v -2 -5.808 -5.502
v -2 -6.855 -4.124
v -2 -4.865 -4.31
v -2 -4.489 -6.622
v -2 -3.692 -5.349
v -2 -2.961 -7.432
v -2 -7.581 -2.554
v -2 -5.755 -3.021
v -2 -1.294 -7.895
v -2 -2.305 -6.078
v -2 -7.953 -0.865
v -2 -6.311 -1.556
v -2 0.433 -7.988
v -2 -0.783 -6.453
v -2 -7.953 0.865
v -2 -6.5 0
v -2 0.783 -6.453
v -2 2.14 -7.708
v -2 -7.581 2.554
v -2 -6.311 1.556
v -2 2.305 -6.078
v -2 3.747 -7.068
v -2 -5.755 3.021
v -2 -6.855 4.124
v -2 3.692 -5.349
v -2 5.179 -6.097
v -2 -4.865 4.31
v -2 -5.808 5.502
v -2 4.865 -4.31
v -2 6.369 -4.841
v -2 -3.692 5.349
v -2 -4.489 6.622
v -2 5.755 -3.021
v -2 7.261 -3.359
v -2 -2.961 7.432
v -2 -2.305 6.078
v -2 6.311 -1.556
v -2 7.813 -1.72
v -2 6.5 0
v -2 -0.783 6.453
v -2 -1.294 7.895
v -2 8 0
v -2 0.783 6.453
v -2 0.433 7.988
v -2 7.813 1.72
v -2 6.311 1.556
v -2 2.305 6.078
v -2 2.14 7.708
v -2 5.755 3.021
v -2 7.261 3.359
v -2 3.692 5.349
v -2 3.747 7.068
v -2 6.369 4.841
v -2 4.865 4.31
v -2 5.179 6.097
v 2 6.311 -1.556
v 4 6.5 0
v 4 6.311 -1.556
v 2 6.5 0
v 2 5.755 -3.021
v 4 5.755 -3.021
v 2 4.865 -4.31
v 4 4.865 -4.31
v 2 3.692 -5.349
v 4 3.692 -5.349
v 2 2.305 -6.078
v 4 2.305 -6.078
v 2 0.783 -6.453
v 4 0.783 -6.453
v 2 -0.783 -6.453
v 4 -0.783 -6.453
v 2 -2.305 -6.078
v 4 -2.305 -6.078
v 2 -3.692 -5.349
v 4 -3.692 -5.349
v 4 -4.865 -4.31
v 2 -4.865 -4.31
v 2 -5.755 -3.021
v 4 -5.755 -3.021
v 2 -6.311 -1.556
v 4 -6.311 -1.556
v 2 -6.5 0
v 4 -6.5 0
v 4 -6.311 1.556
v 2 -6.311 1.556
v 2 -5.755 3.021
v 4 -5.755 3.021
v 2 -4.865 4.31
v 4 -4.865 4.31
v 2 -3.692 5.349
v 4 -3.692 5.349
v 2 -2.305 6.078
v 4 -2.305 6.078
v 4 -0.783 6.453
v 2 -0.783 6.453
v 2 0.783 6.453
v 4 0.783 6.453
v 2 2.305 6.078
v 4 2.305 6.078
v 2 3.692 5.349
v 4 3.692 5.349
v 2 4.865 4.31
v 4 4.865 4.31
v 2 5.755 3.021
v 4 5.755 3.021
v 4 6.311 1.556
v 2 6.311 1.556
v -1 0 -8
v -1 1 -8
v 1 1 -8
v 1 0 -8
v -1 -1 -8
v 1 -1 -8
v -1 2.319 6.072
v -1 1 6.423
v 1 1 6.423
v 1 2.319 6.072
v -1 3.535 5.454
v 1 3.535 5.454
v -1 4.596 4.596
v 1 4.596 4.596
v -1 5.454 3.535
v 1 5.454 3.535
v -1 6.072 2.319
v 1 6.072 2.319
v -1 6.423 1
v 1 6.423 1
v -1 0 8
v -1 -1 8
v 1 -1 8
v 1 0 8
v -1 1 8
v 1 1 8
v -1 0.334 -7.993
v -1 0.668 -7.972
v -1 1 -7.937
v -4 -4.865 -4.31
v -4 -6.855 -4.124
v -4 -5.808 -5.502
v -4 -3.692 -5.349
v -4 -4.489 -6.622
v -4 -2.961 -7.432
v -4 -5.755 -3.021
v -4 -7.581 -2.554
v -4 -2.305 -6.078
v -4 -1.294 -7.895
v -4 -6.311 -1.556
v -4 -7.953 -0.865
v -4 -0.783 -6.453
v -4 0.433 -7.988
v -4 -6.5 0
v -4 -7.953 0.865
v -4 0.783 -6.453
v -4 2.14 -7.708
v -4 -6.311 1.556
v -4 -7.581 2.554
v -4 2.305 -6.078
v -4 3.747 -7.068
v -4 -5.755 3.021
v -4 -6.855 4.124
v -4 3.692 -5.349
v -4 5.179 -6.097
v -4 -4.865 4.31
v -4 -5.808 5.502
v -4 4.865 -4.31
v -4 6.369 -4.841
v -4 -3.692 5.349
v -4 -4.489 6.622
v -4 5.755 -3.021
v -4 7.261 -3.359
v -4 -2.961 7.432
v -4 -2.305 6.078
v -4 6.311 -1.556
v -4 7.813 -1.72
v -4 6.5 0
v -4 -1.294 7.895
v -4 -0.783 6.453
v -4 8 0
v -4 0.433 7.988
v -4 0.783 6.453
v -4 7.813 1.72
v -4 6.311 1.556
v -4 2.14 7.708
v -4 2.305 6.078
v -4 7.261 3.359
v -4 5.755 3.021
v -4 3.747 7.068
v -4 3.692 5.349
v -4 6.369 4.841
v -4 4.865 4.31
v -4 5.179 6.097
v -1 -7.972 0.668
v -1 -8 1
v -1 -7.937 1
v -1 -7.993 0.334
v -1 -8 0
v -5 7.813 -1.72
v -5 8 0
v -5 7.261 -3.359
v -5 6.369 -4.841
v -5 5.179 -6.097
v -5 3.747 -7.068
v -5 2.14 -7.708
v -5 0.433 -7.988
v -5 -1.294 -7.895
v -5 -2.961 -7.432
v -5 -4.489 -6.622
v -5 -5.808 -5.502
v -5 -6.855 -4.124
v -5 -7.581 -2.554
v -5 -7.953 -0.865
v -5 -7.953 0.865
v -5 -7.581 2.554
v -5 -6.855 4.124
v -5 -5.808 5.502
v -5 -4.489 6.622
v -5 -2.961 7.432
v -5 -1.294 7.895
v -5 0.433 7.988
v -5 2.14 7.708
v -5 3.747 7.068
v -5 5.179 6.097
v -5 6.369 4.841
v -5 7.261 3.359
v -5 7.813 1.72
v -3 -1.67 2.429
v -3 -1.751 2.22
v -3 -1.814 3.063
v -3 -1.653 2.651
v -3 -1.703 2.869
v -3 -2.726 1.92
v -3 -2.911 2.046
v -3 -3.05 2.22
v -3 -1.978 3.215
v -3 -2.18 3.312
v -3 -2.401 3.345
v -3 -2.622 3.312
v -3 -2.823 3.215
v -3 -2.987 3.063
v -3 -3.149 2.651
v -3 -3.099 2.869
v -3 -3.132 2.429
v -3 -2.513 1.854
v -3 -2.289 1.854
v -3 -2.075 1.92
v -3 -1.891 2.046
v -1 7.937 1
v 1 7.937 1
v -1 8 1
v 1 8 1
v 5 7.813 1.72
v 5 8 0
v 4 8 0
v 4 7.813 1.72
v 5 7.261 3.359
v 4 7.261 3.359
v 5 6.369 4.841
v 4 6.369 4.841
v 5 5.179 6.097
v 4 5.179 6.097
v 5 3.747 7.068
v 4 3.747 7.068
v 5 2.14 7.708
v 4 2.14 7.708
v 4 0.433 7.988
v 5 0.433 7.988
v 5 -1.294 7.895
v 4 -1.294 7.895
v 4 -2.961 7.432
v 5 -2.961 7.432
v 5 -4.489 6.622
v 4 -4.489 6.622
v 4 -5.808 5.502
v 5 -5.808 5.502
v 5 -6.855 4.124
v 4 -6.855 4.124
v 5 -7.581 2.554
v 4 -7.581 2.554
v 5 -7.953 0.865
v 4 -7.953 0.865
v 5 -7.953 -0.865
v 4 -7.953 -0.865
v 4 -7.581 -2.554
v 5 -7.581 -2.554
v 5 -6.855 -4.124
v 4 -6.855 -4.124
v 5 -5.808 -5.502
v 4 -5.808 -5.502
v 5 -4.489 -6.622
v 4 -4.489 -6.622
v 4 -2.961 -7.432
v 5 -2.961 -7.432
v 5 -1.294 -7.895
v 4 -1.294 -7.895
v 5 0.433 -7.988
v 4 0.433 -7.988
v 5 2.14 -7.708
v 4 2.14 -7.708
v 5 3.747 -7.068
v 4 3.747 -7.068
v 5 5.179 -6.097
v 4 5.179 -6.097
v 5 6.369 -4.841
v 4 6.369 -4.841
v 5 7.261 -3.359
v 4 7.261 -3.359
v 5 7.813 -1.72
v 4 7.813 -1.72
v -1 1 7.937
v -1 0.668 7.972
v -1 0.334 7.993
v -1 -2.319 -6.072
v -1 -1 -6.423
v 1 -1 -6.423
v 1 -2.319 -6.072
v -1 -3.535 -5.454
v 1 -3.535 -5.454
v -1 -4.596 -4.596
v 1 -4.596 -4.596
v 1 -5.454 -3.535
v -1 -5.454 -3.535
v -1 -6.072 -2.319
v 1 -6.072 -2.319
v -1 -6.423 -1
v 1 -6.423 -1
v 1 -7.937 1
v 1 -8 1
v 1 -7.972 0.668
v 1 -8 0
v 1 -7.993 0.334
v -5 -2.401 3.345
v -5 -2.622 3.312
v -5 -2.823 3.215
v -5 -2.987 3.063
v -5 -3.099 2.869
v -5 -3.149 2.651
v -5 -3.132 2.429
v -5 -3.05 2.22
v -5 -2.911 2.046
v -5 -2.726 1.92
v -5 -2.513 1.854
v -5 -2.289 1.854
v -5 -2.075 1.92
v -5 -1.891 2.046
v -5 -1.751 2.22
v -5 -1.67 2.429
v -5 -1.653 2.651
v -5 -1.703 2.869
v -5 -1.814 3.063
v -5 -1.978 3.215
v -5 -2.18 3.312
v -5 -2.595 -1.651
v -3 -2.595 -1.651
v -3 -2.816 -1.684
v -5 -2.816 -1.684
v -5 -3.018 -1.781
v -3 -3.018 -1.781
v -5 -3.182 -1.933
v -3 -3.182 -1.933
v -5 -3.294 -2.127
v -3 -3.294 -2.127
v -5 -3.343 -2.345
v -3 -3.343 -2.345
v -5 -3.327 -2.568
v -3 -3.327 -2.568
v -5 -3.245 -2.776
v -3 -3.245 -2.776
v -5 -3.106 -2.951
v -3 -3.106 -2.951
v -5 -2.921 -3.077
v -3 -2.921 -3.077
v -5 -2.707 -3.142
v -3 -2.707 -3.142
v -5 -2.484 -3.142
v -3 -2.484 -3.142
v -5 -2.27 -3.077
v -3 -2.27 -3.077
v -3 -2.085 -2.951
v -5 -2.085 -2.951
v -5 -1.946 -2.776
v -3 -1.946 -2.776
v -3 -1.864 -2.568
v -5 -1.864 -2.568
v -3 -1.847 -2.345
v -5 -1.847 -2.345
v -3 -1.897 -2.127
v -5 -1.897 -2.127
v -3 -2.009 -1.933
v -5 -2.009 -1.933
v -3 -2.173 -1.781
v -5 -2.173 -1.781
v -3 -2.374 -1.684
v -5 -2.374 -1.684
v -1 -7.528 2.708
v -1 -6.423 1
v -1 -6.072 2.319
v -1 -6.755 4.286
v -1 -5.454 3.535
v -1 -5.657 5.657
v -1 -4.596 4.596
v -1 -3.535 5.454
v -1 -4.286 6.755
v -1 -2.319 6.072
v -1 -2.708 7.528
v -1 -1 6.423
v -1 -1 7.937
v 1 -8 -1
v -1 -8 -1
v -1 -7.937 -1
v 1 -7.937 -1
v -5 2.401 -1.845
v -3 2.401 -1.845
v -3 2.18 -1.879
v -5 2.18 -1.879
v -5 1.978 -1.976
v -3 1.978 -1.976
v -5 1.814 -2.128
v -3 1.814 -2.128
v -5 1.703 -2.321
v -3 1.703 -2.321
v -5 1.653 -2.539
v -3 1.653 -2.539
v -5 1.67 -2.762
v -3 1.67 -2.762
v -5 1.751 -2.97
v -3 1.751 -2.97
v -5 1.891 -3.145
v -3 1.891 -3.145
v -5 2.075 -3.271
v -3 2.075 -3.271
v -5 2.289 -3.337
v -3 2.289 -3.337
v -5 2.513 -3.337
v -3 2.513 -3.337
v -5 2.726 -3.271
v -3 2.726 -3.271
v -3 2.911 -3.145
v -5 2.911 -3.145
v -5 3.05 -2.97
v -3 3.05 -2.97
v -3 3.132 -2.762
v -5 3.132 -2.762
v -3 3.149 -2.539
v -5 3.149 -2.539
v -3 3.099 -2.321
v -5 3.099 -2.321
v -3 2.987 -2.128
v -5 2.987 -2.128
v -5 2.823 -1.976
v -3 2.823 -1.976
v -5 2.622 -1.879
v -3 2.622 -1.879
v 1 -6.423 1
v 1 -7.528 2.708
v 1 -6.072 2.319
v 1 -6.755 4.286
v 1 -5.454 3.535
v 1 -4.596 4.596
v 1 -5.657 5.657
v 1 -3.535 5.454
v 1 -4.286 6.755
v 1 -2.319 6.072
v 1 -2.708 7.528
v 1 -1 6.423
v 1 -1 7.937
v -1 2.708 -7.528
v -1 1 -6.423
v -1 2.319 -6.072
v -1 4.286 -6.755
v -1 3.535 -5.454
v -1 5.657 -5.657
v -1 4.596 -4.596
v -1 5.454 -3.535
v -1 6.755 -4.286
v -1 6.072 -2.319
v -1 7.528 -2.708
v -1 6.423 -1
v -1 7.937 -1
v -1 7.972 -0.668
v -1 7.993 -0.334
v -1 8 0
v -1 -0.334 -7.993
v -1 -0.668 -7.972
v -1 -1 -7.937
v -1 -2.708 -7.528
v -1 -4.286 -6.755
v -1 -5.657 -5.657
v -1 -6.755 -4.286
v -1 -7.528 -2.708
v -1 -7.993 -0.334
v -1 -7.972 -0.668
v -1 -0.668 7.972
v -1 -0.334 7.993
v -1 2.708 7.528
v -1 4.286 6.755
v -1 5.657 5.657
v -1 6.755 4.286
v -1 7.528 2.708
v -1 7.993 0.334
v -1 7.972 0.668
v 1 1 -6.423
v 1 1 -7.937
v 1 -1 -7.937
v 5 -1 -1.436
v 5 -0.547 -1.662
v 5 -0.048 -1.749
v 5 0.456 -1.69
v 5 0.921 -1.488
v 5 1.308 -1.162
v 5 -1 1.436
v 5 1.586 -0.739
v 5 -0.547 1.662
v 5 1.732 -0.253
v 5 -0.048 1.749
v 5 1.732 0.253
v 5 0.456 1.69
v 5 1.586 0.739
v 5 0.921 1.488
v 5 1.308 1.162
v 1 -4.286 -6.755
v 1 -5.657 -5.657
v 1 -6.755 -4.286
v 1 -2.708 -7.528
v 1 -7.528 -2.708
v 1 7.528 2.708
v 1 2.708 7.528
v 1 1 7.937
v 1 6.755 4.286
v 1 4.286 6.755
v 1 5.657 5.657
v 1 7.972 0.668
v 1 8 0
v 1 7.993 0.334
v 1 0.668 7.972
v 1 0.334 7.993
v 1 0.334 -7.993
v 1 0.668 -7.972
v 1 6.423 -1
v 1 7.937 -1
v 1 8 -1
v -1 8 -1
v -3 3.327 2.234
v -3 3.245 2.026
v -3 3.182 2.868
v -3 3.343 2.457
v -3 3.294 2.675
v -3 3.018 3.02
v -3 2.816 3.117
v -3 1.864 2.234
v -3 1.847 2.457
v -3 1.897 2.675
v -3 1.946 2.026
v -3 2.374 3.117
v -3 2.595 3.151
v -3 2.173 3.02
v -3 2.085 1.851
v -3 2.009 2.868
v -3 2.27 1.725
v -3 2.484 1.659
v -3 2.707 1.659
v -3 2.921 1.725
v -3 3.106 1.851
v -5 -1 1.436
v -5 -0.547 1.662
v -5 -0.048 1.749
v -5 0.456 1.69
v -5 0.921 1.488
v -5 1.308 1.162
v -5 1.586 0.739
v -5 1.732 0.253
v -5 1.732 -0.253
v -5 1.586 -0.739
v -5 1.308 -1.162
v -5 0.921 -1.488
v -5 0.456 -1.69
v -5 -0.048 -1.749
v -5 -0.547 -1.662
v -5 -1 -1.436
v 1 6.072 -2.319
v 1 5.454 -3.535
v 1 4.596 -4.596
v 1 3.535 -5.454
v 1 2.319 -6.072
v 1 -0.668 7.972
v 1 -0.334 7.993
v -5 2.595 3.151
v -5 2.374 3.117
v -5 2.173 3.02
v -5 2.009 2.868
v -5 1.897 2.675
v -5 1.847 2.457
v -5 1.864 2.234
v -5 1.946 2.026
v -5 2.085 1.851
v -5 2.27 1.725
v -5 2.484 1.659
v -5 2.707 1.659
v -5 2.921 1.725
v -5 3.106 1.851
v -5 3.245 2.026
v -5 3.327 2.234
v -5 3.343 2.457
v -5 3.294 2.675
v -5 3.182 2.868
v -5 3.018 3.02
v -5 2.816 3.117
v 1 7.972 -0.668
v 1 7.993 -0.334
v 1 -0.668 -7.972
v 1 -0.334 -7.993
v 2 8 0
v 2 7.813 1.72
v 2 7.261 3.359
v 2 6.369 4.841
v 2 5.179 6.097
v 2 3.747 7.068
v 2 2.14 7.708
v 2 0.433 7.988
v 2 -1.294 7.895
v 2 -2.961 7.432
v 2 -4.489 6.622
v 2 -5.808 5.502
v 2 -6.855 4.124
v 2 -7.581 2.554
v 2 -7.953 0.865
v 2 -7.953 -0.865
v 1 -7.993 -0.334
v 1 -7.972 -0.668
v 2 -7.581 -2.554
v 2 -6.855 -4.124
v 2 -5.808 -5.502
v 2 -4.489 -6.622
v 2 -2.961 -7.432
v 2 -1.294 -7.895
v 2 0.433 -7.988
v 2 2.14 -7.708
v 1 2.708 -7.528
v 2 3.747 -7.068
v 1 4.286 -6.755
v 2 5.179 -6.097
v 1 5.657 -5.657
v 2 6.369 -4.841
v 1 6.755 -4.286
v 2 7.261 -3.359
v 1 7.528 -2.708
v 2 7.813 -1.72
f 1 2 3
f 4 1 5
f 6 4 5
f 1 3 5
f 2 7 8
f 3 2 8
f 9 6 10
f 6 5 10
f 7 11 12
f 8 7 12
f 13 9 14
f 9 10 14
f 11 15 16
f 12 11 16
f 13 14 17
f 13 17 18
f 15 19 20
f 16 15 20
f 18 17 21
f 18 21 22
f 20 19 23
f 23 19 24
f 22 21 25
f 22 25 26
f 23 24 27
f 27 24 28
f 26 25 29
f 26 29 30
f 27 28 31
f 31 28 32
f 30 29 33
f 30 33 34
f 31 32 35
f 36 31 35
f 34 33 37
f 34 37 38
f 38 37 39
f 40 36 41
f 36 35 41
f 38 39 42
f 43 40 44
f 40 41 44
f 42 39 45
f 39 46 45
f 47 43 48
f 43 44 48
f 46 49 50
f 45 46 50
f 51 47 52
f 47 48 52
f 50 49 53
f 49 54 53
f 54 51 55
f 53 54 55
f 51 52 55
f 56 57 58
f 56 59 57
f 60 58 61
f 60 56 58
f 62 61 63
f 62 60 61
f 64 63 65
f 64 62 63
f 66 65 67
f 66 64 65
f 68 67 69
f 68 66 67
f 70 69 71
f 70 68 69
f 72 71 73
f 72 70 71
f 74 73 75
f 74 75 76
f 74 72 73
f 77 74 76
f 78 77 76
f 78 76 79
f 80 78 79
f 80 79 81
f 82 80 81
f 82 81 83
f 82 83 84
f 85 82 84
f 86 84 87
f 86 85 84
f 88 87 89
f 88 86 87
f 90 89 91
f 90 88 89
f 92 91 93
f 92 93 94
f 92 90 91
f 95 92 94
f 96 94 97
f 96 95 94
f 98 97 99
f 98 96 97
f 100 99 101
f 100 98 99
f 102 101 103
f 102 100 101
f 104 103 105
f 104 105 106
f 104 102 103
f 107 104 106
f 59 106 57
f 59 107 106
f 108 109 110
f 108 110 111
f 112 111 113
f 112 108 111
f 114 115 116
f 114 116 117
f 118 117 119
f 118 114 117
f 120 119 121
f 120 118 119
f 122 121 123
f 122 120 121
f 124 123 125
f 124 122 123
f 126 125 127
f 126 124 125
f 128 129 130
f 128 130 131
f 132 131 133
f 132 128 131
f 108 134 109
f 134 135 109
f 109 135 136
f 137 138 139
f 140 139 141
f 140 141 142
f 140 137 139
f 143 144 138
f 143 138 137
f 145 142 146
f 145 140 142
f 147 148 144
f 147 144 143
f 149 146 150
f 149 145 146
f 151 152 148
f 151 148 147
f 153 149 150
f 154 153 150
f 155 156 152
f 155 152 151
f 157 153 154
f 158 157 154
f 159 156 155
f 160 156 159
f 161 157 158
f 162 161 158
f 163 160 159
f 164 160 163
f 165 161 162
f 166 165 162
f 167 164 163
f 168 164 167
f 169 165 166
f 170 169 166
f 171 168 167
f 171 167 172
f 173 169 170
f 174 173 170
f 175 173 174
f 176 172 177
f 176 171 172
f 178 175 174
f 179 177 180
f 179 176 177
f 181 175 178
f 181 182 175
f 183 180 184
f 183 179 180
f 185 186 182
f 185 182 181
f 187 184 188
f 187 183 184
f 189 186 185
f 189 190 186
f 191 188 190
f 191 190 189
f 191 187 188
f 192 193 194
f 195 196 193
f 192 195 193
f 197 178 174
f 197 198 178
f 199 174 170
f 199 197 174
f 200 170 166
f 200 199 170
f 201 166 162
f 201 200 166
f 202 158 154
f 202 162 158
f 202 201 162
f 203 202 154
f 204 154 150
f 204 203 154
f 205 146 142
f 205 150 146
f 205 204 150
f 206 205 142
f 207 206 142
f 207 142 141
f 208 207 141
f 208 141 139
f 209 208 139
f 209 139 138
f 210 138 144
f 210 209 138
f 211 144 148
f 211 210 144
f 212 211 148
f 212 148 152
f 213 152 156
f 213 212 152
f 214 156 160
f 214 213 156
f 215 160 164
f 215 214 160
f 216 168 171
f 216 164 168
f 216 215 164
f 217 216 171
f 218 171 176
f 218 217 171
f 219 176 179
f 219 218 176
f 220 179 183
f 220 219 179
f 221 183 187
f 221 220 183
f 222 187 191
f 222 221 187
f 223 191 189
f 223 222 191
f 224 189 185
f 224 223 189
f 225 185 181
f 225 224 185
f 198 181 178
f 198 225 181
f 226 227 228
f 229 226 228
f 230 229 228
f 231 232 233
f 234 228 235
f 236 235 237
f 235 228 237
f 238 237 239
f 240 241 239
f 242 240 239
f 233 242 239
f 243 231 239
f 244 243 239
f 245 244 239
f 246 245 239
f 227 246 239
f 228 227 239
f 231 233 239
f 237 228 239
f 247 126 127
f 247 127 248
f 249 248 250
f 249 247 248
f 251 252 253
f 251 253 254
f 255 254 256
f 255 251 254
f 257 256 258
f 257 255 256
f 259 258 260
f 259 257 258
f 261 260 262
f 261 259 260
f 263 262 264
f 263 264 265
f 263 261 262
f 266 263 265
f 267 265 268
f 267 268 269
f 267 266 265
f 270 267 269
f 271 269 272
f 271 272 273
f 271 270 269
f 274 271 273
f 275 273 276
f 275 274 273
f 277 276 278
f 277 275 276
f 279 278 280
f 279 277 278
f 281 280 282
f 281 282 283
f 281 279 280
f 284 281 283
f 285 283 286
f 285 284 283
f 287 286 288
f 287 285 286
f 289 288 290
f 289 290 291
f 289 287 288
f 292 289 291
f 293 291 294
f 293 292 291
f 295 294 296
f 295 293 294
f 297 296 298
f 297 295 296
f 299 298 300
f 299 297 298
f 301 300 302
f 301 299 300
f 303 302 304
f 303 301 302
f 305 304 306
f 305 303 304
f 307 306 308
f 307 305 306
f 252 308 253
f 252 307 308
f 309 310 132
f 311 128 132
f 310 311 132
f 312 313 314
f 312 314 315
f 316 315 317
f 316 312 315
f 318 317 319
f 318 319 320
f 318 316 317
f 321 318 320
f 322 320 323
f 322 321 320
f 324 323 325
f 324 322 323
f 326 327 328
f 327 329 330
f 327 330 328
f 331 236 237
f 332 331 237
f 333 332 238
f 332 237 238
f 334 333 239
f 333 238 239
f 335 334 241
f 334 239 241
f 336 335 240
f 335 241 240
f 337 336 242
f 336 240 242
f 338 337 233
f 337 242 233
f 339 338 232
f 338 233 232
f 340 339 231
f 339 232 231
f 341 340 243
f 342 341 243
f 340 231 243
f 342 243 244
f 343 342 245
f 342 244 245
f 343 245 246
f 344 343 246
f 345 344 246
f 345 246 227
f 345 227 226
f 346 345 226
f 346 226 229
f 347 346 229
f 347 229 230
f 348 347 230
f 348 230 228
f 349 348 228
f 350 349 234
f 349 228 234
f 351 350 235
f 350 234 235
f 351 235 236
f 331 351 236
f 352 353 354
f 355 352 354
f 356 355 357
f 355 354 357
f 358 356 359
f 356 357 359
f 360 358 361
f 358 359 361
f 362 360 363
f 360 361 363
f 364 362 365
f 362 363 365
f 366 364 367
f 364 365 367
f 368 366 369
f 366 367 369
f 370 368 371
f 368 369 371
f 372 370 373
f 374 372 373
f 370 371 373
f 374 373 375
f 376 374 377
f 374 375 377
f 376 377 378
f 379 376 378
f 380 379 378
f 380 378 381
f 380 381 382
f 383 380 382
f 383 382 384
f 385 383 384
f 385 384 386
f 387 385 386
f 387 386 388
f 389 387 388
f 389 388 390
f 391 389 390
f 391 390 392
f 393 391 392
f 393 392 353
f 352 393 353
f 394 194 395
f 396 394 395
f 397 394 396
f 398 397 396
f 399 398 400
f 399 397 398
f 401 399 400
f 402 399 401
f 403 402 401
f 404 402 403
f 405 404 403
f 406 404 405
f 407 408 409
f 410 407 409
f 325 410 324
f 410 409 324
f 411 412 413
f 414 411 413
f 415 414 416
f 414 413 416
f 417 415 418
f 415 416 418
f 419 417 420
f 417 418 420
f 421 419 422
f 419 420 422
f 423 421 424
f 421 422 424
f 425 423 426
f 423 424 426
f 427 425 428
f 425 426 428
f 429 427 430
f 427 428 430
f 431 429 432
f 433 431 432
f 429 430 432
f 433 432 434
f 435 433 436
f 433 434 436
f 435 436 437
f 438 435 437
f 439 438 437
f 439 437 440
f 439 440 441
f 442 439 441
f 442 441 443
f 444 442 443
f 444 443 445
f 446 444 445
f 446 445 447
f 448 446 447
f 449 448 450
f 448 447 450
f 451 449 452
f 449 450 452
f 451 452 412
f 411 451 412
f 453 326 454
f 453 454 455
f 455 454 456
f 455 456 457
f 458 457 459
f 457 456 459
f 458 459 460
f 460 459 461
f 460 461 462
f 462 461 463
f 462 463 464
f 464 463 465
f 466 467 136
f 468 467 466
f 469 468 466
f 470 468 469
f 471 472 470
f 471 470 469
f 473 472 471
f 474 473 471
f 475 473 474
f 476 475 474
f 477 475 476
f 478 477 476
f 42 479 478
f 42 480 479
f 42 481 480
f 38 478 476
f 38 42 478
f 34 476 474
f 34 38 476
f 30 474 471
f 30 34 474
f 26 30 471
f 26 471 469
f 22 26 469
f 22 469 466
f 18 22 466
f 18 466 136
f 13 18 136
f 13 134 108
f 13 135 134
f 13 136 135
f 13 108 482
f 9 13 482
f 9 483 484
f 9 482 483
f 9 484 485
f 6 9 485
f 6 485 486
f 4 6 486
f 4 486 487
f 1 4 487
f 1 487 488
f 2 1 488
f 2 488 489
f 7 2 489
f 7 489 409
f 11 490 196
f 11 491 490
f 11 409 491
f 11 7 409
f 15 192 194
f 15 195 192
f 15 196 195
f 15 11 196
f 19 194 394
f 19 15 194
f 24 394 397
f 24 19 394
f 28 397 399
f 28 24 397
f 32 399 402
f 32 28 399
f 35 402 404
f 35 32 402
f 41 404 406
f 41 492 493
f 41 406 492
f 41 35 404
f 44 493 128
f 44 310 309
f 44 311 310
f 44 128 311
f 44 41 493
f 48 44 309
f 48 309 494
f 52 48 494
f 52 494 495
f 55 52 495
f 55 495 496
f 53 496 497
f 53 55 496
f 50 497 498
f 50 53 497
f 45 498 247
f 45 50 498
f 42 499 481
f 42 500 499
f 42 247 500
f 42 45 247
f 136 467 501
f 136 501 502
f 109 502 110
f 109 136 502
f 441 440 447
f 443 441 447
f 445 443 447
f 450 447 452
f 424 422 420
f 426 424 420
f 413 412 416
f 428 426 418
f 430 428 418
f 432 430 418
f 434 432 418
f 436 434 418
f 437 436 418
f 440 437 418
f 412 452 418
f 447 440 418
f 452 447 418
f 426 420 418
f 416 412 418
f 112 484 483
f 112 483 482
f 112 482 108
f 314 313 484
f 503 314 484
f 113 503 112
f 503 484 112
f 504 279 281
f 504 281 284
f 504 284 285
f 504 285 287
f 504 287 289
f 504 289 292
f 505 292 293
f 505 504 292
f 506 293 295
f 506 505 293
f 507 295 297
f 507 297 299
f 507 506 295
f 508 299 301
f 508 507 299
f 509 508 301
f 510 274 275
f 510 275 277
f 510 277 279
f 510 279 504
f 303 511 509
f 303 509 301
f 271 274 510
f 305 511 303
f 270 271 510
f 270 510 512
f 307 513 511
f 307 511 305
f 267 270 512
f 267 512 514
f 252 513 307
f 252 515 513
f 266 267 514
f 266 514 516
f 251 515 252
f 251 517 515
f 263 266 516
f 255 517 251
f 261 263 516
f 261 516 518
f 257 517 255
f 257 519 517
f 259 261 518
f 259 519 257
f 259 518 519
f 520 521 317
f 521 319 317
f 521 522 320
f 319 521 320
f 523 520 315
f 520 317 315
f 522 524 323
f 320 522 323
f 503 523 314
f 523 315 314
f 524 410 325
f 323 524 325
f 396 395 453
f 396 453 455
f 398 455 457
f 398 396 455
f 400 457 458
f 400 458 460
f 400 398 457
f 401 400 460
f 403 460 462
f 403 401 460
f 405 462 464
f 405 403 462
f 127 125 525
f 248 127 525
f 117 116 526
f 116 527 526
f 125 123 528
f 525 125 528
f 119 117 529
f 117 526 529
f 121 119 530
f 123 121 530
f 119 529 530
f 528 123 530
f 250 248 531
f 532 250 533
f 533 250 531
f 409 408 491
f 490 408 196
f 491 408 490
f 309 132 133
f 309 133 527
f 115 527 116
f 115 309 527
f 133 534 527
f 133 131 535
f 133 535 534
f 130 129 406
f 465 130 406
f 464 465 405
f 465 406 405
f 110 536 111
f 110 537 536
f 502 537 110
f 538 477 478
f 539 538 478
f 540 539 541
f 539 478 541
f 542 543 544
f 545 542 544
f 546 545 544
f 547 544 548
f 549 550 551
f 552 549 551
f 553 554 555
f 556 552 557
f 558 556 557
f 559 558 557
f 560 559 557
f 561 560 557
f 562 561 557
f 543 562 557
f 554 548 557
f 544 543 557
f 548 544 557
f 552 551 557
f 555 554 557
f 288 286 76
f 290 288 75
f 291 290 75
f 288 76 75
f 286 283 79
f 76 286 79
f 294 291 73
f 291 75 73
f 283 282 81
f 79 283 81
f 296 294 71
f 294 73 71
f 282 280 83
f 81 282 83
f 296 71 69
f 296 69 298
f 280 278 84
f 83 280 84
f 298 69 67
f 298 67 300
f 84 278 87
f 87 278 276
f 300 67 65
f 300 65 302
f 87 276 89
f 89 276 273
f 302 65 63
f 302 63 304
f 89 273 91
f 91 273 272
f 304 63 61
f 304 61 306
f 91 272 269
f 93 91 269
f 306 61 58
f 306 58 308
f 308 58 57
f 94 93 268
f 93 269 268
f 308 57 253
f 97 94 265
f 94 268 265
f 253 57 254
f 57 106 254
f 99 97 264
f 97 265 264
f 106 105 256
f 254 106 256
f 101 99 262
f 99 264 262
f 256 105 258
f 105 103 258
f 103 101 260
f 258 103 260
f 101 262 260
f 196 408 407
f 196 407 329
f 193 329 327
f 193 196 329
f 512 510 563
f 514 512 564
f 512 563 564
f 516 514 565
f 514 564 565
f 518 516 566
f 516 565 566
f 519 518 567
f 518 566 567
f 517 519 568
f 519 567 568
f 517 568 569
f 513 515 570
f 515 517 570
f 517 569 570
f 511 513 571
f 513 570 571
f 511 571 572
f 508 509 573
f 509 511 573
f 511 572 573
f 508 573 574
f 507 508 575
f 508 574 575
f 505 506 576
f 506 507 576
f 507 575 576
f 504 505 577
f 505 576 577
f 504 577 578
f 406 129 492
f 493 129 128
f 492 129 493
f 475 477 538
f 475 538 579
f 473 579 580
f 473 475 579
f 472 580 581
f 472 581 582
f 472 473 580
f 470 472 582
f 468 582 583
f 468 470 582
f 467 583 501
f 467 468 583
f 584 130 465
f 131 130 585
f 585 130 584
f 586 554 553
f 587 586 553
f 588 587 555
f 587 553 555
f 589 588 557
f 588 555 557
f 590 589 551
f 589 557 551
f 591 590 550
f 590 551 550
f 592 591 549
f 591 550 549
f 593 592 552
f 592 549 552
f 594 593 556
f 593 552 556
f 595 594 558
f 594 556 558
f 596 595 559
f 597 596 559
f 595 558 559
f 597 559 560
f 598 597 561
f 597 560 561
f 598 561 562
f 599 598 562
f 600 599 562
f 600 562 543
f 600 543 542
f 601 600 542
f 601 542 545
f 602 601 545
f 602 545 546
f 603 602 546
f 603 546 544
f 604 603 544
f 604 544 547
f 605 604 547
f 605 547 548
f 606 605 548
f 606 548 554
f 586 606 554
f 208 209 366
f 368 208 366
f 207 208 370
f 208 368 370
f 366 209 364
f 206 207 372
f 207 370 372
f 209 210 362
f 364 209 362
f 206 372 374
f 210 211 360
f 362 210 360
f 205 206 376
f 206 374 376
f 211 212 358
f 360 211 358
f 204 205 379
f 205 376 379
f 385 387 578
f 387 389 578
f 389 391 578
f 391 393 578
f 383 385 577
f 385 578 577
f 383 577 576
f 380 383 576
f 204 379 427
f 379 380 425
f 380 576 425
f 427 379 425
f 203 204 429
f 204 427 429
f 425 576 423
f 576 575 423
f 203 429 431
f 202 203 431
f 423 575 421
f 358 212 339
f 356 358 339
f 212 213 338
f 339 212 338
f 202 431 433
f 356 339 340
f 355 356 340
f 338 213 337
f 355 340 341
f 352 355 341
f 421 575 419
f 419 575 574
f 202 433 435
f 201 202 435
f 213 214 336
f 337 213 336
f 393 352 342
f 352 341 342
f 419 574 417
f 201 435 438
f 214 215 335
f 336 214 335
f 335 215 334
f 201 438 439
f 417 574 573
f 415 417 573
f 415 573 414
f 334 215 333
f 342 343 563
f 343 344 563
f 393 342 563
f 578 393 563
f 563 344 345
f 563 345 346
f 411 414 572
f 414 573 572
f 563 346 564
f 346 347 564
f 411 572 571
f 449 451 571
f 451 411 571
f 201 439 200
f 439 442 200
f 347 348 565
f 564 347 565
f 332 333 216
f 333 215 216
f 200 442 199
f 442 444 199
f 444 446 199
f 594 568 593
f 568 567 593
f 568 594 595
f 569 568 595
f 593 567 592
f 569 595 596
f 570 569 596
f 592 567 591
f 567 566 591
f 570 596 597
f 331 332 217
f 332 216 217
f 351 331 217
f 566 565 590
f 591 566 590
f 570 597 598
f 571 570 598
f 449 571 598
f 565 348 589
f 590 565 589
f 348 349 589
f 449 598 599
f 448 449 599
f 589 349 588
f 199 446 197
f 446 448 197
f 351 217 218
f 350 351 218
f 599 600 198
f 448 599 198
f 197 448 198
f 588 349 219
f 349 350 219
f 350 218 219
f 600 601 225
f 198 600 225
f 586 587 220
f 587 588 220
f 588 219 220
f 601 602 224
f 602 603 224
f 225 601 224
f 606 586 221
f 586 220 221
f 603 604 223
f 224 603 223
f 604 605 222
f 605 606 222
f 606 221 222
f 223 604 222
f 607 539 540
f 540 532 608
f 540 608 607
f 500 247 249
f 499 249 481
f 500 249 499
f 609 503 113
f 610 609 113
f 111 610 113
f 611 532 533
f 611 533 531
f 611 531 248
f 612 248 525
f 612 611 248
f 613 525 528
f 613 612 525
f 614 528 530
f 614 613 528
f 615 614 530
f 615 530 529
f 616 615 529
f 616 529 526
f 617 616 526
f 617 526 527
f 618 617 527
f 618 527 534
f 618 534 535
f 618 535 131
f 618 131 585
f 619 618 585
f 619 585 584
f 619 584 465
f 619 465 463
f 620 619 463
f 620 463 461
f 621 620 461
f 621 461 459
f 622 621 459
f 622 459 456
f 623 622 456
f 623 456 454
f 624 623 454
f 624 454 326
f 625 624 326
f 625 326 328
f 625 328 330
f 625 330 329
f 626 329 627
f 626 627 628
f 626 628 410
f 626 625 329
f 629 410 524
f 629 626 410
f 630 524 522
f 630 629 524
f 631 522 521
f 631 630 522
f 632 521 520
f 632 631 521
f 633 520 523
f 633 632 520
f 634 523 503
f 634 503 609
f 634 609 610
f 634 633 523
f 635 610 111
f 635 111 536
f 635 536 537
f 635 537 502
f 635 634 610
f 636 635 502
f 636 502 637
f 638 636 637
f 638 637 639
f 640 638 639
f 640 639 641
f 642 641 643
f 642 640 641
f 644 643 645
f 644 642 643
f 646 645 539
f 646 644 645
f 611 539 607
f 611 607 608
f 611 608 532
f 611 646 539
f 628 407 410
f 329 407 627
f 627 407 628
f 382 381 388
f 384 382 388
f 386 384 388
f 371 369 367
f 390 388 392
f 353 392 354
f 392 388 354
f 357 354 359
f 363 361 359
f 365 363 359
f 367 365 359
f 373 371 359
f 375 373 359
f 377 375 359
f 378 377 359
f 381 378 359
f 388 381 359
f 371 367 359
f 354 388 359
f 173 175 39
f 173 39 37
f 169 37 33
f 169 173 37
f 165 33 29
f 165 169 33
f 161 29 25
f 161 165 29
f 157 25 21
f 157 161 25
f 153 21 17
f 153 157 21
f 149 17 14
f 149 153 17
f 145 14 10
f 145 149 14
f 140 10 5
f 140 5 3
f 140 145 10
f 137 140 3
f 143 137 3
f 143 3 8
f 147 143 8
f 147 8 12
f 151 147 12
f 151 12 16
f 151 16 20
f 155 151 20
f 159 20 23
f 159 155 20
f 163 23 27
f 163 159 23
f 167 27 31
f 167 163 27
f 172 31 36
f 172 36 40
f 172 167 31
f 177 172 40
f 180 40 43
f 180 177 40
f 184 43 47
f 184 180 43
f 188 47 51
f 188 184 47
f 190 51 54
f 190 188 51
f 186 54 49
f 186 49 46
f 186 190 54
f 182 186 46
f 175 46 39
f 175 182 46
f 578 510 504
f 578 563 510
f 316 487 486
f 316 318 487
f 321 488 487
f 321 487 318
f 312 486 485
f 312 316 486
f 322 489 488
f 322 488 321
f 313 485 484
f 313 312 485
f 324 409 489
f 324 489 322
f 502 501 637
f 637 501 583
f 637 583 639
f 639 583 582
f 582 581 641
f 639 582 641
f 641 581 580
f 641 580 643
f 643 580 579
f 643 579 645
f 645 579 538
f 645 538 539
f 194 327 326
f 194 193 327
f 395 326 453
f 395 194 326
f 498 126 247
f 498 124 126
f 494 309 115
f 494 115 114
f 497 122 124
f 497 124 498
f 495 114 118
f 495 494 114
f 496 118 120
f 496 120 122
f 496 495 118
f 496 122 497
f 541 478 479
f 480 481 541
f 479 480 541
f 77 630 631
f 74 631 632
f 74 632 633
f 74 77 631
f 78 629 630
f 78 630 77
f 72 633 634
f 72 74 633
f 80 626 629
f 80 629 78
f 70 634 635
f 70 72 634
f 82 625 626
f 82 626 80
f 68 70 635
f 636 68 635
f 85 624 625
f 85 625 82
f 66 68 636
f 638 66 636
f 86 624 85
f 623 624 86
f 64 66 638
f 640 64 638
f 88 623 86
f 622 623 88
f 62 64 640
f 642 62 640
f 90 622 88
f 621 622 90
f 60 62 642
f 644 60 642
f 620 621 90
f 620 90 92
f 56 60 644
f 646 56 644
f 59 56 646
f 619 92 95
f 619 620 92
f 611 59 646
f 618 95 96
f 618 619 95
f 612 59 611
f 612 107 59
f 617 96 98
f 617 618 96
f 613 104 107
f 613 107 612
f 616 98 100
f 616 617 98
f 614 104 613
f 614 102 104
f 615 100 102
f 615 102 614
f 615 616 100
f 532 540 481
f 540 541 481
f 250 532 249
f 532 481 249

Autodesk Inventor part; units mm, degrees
ref_plane "YZ Plane" through (0, 0, 0) normal (1, 0, 0) x (0, 1, 0)
ref_plane "XZ Plane" through (0, 0, 0) normal (0, 1, 0) x (-1, 0, 0)
ref_plane "XY Plane" through (0, 0, 0) normal (0, 0, 1) x (1, 0, 0)
sketch "Szkic1" plane through (0, 0, 0) normal (1, 0, 0) x (0, 1, 0)
  circle A0 centre (0, 0) radius 6.5
  circle A1 centre (0, 0) radius 1.75
  line L0 (0, 1.75) -> (0, -1.0846)
  line L1 (-1, 1.9718) -> (-1, -1.0846)
  line L2 (8, 0) -> (-8, 0)
  line L3 (-8, 0) -> (-8, -1)
  line L4 (-8, -1) -> (8, -1)
  line L5 (8, -1) -> (8, 0)
  line L6 (8, 0) -> (-8, 0)
  line L7 (-8, 0) -> (-8, 1)
  line L8 (-8, 1) -> (8, 1)
  line L9 (8, 1) -> (8, 0)
  line L10 (0, 8) -> (1, 8)
  line L11 (1, 8) -> (1, -8)
  line L12 (1, -8) -> (0, -8)
  line L13 (0, 8) -> (-1, 8)
  line L14 (-1, 8) -> (-1, -8)
  line L15 (-1, -8) -> (0, -8)
  line L16 (0, -8) -> (0, 8)
  point P0 (-1, -1.4361)
  point P1 (-1, 1.4361)
  point P2 (-6.4226, -1)
  point P3 (-6.4226, 1)
  point P4 (1, -6.4226)
  point P5 (-1, -6.4226)
  point P6 (6.4226, 1)
  point P7 (6.4226, -1)
  point P8 (-1, 6.4226)
  point P9 (1, 6.4226)
  dimension "d1" = 3.5
  dimension "d0" = 13
  dimension "d2" = 1
  dimension "d14" = 16
  dimension "d16" = 16
  dimension "d18" = 2
  dimension "d19" = 2
sketch "Szkic2" plane through (0, 0, 0) normal (0, 0, 1) x (1, 0, 0)
  line L0 (0, 0) -> (5, 0)
  line L1 (5, 0) -> (5, 6)
  line L2 (5, 6) -> (0, 6)
  line L3 (0, 6) -> (0, 0)
  line L4 (0, 0) -> (-5, 0)
  line L5 (-5, 0) -> (-5, 6)
  line L6 (-5, 6) -> (0, 6)
  line L7 (0, 6) -> (0, 0)
  line L8 (0, 0) -> (5, 0)
  line L9 (5, 0) -> (5, -6)
  line L10 (5, -6) -> (0, -6)
  line L11 (0, -6) -> (0, 0)
  line L12 (0, 0) -> (-5, 0)
  line L13 (-5, 0) -> (-5, -6)
  line L14 (-5, -6) -> (0, -6)
  line L15 (0, -6) -> (0, 0)
  line L16 (5, 6) -> (4, 6)
  line L17 (4, 6) -> (4, 8)
  line L18 (4, 8) -> (5, 8)
  line L19 (5, 8) -> (5, 6)
  line L20 (2, 6) -> (1, 6)
  line L21 (1, 6) -> (1, 8)
  line L22 (1, 8) -> (2, 8)
  line L23 (2, 8) -> (2, 6)
  line L24 (-5, 6) -> (-4, 6)
  line L25 (-4, 6) -> (-4, 8)
  line L26 (-4, 8) -> (-5, 8)
  line L27 (-5, 8) -> (-5, 6)
  line L28 (-2, 6) -> (-1, 6)
  line L29 (-1, 6) -> (-1, 8)
  line L30 (-1, 8) -> (-2, 8)
  line L31 (-2, 8) -> (-2, 6)
  point P0 (-1, 6)
  point P1 (1, 6)
  point P2 (0, 6)
  dimension "d3" = 5
  dimension "d4" = 6
  dimension "d5" = 10
  dimension "d6" = 12
  dimension "d7" = 1
  dimension "d8" = 2
  dimension "d9" = 1
  dimension "d10" = 1
  dimension "d11" = 2
  dimension "d12" = 1
  dimension "d13" = 2
extrude "Wyciągnięcie proste1" add sketch "Szkic1" along normal mid plane 10 contours L2 A1 L8 A0 | A0 L4 A1 L2 | L8 A1 L11 A0 | A0 L11 A1 L4 | L11 A1 L16 A0 | A0 L16 A1 L11 | L16 A1 L1 L14 A0 | A0 L14 A1 L16 | L14 L1 A1 L8 A0 | A0 L4 A1 L14 | L2 A1 L8 L1 | L1 L4 A1 L2 | L8 A1 L2 A0 | L1 L8 A1 | A0 L2 A1 L4 | A1 L4 L1 L14
extrude "Wyciągnięcie proste2" add sketch "Szkic1" along normal mid plane 2 contours L2 L5 L4 A0 | A0 L8 L9 L2 | A0 L16 L10 L11 | L11 L12 L16 A0 | A0 L14 L13 L16 | L16 L15 L14 A0 | A0 L2 L7 L8 | L4 L3 L2 A0
revolve "Obrót1" add sketch "Szkic2" angle 360 about axis through (0, 0, 0) along (1, 0, 0) contours L2 L17 L18 L19 | L21 L22 L23 L2 | L6 L31 L30 L29 | L27 L26 L25 L6
sketch "Sketch3" plane through (-5, 0, 0) normal (-1, 0, 0) x (0, 0, 1)
  circle A0 centre (0, 0) radius 3.5355
  point P0 (2.4008, 2.5954)
  point P1 (-2.5954, 2.4008)
  point P2 (-2.4008, -2.5954)
  point P3 (2.5954, -2.4008)
  dimension "d25" = 7.071
  dimension "d28" = 360
hole "Hole2" at (-5, 2.5954, 2.4008) at (-5, 2.4008, -2.5954) at (-5, -2.5954, -2.4008) at (-5, -2.4008, 2.5954) direction (1, 0, 0) diameter 1.5 depth 2
properties part number "srodek-kolo"
